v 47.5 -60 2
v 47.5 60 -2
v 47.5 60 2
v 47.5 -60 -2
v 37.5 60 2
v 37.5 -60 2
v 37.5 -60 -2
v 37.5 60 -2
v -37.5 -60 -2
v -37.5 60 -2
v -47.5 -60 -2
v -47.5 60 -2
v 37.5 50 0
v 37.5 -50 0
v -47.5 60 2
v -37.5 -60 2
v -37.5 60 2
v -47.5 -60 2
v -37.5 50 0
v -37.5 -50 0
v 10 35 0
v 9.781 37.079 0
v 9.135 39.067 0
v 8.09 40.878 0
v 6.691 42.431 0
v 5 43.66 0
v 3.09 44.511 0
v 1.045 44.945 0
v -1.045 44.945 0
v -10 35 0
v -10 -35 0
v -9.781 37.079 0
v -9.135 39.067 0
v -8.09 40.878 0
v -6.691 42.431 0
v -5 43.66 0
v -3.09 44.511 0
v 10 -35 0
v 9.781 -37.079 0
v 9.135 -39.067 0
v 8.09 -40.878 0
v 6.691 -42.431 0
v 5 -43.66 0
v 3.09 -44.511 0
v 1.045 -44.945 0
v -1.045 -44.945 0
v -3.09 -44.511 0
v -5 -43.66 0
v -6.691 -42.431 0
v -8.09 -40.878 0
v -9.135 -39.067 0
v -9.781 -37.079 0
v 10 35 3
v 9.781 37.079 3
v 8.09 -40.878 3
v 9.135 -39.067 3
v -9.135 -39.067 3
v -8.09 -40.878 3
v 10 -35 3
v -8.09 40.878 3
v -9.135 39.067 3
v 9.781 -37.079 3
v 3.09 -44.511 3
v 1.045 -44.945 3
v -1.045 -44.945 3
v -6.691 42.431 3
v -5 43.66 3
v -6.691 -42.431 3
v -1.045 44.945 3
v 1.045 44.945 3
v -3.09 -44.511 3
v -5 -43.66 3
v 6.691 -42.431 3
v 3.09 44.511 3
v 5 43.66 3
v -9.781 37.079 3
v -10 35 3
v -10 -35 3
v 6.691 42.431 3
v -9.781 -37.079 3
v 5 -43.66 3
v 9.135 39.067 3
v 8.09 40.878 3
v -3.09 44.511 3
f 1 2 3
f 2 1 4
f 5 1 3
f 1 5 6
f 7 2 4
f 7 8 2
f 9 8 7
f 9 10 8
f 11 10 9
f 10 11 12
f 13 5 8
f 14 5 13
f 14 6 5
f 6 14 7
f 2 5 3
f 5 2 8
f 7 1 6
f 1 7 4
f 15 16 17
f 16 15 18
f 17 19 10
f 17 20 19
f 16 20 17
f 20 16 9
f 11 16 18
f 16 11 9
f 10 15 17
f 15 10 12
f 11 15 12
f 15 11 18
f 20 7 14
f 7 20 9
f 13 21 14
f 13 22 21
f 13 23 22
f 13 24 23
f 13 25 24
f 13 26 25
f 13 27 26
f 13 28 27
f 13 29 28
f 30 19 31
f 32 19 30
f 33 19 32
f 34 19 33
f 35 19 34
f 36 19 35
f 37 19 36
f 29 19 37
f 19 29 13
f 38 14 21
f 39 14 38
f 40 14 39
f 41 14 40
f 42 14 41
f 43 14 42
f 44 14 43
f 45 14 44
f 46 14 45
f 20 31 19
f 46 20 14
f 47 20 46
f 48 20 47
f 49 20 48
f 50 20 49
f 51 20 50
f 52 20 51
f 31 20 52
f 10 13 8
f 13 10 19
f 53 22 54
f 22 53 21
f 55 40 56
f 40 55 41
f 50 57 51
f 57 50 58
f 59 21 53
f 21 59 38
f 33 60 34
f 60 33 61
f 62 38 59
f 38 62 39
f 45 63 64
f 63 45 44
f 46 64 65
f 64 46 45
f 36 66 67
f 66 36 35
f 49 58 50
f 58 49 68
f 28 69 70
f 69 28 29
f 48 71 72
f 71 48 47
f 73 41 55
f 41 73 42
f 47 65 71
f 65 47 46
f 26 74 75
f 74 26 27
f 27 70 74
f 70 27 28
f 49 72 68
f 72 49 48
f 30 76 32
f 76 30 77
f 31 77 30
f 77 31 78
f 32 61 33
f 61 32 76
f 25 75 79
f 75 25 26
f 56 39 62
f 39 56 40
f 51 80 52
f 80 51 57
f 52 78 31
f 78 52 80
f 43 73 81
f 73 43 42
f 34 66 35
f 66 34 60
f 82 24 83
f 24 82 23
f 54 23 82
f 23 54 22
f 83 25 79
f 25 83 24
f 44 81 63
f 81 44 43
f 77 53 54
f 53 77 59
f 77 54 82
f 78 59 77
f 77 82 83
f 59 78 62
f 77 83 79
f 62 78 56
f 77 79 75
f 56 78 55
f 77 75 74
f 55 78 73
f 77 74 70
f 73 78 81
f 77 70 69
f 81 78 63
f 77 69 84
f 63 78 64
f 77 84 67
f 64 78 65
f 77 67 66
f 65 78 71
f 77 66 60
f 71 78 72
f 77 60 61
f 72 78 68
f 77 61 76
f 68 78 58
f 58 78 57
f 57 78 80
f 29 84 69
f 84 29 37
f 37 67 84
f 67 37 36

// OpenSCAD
// file: syms.scad
module symY(t) {
    translate(t)
        children();
    mirror([0,1,0])
        translate(t)
            children();
}
module symX(t) {
    translate(t)
        children();
    mirror([1,0,0])
        translate(t)
            children();
}

module	symXY(t) {
	tx=t[0];
	ty=t[1];
	tz=t[2];
	symX([tx,0,0])
	symY([0,ty,tz])
		children();
}
// main file
use <syms.scad>

ROAD_H=2;
FLOOR_H=4;
LANE_W=45;

PLATFORM_W=20;
PLATFORM_H=5;
PLATFORM_Y=70;


ROAD_L=120;
ROAD_EDGE_W=10;
ROAD_W=LANE_W+2*ROAD_EDGE_W+PLATFORM_W;
ROAD_RAMP_LEN=10;


module road() {
    
    FLOOR_SHAPE=[
        [0,0],
        [ROAD_RAMP_LEN,ROAD_H],
        [ROAD_L-ROAD_RAMP_LEN,ROAD_H],
        [ROAD_L,0],
    
    ];
    
    // bottom "road" shape
    color([0.5,0.5,.5])
    translate([-ROAD_W/2,-ROAD_L/2,-ROAD_H])
    rotate(90,[0,0,1])
    rotate(90,[1,0,0])
    linear_extrude(height=ROAD_W)
    polygon(points=FLOOR_SHAPE);
    
    // sides of the road
    symX([ROAD_W/2,0,FLOOR_H/2-ROAD_H])
    cube([ROAD_EDGE_W,ROAD_L,FLOOR_H],center=true);
    
    // platform
    hull()
    symY([0,PLATFORM_Y/2,PLATFORM_H/2-ROAD_H]) {
        cylinder(d=PLATFORM_W,h=PLATFORM_H,center=true);
    }
    
    // cutouts
    
}



module preview() {
//    translate(BOOTH_POS)
    road();
}


mode="preview";
if(mode=="preview")
    preview();

if(mode=="road")
    road();
